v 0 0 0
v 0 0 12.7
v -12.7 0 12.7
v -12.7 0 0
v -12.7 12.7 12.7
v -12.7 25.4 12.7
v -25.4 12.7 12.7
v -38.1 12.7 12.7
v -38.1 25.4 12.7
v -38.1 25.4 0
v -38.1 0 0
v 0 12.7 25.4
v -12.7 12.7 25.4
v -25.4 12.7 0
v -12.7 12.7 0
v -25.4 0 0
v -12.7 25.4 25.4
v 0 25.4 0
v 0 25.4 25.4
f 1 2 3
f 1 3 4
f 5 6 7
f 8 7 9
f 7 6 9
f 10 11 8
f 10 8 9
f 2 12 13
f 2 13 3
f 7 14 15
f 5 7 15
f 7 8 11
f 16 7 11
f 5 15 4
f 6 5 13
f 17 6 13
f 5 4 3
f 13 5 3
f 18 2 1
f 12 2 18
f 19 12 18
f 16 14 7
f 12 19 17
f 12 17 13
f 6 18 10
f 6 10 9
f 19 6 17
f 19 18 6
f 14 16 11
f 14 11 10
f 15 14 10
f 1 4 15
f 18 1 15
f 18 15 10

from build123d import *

# Parameters (mm, degrees)
F1_DEPTH = 38.1
F2_W     = 25.4
F2_H     = 12.7
F3_DEPTH = 25.4
F4_W     = 12.7
F4_H     = 12.7
F5_DEPTH = 12.7
F7_DEPTH = 12.7


with BuildPart() as f1:
    # F0 (on Right) → F1 (new body)
    with BuildSketch(Plane.YZ):
        Polygon((0, 12.7), (0, 0), (25.4, 0), (25.4, 25.4), (12.7, 25.4), align=None)
    extrude(amount=-F1_DEPTH)

    # F2 (on face) → F3 (cut)
    with BuildSketch(Plane(origin=(0, 25.4, 0), x_dir=(-1, 0, 0), z_dir=(0, 1, 0))):
        with Locations((25.4, 19.05)):
            Rectangle(F2_W, F2_H)
    extrude(amount=-F3_DEPTH, mode=Mode.SUBTRACT)

    # F4 (on face) → F5 (cut)
    with BuildSketch(Plane.XZ):
        with Locations((-19.05, 6.35)):
            Rectangle(F4_W, F4_H)
    extrude(amount=-F5_DEPTH, mode=Mode.SUBTRACT)

    # F6 (on face) → F7 (cut)
    with BuildSketch(Plane(origin=(-38.1, 0, 0), x_dir=(0, -1, 0), z_dir=(-1, 0, 0))):
        Polygon((-12.7, 12.7), (0, 0), (0, 12.7), align=None)
    extrude(amount=-F7_DEPTH, mode=Mode.SUBTRACT)


solid = f1.part
